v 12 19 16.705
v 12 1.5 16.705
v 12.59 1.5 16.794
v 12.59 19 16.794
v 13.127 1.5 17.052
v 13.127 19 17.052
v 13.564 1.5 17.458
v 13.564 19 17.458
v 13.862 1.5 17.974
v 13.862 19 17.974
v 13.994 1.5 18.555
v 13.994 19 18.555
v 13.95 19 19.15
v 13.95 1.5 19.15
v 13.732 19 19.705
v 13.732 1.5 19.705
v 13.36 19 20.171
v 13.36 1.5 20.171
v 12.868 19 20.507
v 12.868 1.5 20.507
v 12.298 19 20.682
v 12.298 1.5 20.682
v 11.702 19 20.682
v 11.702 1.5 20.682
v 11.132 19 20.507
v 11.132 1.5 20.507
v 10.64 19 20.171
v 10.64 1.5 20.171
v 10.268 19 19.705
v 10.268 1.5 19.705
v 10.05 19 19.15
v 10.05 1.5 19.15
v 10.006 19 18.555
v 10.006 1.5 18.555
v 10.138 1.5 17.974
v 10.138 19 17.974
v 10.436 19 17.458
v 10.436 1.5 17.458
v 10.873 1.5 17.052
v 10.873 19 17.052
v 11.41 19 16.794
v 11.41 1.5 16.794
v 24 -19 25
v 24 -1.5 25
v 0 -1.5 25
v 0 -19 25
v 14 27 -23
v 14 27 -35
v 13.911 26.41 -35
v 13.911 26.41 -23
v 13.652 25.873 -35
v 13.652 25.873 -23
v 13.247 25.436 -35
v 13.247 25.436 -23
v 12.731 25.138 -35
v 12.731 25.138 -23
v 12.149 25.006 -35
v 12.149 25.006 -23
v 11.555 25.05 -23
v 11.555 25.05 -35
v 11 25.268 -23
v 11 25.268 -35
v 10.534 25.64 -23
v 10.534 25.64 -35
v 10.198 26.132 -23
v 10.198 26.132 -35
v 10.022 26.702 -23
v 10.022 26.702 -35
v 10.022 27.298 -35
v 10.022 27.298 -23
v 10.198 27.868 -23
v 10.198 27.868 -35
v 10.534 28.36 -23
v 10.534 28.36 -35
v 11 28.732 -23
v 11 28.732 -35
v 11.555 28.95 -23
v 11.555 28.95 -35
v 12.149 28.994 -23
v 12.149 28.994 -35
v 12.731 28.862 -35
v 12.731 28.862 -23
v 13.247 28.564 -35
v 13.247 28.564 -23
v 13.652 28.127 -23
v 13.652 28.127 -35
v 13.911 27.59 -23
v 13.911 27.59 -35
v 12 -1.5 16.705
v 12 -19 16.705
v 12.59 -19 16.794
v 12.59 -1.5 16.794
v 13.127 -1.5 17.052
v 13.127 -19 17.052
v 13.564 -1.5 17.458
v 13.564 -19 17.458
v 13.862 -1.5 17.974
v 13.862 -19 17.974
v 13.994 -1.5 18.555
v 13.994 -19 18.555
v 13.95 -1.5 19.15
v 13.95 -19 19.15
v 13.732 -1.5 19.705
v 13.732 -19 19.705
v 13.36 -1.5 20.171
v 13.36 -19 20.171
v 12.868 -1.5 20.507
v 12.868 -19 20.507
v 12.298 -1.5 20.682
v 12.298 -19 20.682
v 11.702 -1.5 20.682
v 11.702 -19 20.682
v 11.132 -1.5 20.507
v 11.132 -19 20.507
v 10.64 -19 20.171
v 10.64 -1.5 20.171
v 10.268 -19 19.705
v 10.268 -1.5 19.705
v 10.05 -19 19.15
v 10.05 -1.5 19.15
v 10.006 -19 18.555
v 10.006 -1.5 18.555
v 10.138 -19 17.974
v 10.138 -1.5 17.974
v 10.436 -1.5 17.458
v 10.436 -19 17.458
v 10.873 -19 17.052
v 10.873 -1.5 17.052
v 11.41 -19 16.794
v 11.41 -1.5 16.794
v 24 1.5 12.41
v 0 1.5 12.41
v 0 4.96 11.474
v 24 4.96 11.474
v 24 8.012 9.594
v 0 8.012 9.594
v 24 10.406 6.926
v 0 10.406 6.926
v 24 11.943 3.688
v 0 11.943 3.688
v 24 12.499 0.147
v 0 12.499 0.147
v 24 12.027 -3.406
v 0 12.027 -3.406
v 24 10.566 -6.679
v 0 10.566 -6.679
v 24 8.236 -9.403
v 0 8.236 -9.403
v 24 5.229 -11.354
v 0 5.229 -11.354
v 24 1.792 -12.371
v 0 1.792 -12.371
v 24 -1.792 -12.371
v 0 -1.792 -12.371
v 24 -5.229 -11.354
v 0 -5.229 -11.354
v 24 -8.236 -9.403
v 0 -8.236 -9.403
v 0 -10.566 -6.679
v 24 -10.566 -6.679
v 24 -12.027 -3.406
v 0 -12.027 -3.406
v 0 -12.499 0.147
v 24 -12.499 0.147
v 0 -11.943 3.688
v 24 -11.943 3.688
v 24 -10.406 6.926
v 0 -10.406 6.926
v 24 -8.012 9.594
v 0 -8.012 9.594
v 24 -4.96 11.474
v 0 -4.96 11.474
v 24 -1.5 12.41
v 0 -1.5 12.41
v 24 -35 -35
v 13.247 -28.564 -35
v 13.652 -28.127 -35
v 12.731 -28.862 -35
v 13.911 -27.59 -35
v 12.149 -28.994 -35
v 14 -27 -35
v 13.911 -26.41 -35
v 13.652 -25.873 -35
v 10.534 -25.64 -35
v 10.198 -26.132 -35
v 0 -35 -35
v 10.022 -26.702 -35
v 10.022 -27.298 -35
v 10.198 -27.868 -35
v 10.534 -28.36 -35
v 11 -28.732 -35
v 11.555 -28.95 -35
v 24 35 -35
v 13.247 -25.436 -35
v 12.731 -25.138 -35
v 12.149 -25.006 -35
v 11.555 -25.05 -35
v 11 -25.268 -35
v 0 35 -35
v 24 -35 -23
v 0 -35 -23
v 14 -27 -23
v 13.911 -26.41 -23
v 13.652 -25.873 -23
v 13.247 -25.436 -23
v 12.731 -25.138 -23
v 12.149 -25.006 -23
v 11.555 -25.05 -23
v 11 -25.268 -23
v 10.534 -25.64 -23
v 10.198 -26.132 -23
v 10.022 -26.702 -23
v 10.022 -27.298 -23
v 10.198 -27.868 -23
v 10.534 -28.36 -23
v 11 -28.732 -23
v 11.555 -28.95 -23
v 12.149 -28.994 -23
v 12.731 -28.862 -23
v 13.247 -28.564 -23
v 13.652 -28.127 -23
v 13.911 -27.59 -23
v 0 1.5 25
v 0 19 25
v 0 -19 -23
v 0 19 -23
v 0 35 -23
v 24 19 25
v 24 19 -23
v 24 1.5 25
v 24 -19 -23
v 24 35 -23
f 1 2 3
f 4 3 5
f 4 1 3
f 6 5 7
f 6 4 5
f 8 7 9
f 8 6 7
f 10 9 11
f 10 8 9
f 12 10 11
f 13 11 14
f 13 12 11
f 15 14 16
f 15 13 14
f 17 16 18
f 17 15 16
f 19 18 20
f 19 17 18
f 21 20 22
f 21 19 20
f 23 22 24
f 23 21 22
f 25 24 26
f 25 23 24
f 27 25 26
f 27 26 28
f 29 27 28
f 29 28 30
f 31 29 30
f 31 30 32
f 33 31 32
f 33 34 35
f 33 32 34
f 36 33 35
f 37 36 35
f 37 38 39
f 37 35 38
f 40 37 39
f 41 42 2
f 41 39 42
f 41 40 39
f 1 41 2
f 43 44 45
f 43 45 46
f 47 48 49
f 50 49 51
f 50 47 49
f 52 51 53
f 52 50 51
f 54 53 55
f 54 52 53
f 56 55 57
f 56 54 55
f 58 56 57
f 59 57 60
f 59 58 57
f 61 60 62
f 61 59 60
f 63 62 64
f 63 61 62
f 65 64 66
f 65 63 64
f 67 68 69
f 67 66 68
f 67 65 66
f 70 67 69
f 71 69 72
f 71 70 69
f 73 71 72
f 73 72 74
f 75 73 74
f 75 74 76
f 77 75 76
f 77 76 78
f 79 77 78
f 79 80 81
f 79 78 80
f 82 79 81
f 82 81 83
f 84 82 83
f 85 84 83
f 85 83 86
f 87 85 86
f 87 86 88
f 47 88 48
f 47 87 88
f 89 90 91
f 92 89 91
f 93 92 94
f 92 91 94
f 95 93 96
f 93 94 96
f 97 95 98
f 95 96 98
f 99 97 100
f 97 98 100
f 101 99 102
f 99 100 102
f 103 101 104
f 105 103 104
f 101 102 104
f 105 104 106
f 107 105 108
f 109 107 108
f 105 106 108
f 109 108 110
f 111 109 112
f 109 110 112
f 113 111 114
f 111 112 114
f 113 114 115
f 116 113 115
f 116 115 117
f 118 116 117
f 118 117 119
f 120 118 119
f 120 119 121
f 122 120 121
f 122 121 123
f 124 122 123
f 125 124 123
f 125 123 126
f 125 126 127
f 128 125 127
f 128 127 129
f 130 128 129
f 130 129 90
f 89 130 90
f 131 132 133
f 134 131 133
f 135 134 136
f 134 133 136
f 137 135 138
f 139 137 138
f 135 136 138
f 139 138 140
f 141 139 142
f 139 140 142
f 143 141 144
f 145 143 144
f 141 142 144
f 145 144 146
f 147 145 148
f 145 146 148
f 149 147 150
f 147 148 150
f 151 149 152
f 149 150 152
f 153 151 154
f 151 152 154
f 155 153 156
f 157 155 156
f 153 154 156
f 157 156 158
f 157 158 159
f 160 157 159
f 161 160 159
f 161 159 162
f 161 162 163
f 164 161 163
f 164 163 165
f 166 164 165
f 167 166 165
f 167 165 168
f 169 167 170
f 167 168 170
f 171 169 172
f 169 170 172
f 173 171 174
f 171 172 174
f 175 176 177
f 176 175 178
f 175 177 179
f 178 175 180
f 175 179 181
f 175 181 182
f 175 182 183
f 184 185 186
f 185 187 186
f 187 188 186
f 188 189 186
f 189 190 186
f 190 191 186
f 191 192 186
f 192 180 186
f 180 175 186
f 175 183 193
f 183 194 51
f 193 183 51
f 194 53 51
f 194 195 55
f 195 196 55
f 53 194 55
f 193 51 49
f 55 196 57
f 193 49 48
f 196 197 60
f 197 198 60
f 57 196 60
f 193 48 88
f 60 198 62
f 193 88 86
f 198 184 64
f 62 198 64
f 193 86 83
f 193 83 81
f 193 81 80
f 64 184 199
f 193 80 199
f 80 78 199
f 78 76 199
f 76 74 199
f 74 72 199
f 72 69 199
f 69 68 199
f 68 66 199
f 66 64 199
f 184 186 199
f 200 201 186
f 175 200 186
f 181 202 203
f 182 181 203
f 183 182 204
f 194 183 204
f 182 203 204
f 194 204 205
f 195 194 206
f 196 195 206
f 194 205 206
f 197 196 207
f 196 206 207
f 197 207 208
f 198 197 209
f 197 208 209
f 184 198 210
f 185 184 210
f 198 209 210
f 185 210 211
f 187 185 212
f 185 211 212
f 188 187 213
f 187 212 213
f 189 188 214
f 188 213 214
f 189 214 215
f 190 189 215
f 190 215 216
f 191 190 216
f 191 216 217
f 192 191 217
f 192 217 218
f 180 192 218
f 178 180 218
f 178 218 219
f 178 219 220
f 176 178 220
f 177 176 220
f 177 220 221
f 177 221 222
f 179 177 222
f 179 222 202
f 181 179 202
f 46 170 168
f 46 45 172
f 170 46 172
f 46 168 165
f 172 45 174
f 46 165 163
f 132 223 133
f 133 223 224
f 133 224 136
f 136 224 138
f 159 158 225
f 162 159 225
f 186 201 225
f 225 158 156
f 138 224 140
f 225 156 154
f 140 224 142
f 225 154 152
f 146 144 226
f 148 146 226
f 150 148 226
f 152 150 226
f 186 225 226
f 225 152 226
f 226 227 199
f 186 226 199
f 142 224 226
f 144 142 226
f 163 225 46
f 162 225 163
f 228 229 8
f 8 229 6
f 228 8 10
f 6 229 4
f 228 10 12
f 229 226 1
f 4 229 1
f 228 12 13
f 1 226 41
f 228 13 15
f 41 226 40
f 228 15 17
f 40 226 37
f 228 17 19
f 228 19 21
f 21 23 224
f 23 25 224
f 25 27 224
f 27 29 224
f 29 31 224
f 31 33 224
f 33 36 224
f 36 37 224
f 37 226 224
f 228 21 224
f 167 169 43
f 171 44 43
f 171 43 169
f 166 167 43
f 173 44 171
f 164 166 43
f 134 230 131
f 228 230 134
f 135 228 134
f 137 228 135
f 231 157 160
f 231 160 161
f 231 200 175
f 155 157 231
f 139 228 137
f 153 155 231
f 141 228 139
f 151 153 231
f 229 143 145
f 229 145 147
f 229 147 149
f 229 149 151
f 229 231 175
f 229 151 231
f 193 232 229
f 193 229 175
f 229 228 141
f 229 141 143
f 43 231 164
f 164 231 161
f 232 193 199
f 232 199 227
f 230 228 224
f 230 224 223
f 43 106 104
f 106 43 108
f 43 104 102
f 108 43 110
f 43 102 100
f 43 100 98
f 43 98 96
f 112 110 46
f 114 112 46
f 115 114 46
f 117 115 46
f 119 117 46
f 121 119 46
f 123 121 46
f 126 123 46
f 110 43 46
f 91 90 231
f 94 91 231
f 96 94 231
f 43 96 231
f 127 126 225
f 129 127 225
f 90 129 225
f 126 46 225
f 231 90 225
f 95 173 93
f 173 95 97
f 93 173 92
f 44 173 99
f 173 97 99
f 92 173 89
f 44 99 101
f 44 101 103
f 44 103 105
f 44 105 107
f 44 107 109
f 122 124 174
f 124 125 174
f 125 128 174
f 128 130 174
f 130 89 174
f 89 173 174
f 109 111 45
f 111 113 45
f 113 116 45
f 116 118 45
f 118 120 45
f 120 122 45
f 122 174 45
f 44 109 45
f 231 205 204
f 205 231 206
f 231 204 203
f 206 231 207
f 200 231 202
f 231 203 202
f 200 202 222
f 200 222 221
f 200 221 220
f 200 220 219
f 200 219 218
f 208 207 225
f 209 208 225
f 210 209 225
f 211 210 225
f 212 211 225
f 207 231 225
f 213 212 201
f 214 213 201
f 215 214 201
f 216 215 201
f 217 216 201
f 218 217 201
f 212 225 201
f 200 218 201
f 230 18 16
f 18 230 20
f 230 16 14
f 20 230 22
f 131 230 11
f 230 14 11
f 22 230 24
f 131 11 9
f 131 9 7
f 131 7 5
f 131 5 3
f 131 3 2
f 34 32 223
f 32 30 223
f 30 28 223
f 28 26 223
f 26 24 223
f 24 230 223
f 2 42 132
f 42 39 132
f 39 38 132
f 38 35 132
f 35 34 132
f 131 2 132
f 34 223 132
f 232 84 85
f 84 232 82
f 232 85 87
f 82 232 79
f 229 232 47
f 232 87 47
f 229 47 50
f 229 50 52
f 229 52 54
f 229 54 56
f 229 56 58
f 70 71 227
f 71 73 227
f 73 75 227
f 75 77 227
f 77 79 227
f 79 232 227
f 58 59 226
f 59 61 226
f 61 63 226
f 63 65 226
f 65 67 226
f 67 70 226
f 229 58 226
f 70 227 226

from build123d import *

# Parameters (mm, degrees)
BOSS_EXTRUDE1_DEPTH = 24
SKETCH2_R           = 2
CUT_EXTRUDE1_DEPTH  = 20
SKETCH3_R           = 2
CUT_EXTRUDE2_DEPTH  = 20.5


with BuildPart() as part:
    # Sketch1 → Boss-Extrude1 (new body)
    with BuildSketch(Plane(origin=(0, 0, 0), x_dir=(0, 0, -1), z_dir=(1, 0, 0))):
        with BuildLine():
            Line((23, 35), (23, 19))
            Line((23, 19), (-25, 19))
            Line((-25, 19), (-25, 1.5))
            Line((-25, 1.5), (-12.409673646, 1.5))
            ThreePointArc((-12.409673646, 1.5), (12.5, 0), (-12.409673646, -1.5))
            Line((-12.409673646, -1.5), (-25, -1.5))
            Line((-25, -1.5), (-25, -19))
            Line((-25, -19), (23, -19))
            Line((23, -19), (23, -35))
            Line((23, -35), (35, -35))
            Line((35, -35), (35, 35))
            Line((35, 35), (23, 35))
        make_face()
    extrude(amount=BOSS_EXTRUDE1_DEPTH)

    # Sketch2 → Cut-Extrude1 (cut)
    with BuildSketch(Plane.XY.offset(-23)):
        with Locations((12, -27)):
            Circle(SKETCH2_R)
    cut_extrude1 = extrude(amount=-CUT_EXTRUDE1_DEPTH, mode=Mode.SUBTRACT)

    # Sketch3 → Cut-Extrude2 (cut)
    with BuildSketch(Plane.XZ.offset(19)):
        with Locations(Location((12, 18.704836823, 0), (0, 0, 270))):
            Circle(SKETCH3_R)
    cut_extrude2 = extrude(amount=-CUT_EXTRUDE2_DEPTH, mode=Mode.SUBTRACT)

    # Mirror1: Cut-Extrude1, Cut-Extrude2 across plane
    add(cut_extrude1.mirror(Plane.ZX), mode=Mode.SUBTRACT)
    add(cut_extrude2.mirror(Plane.ZX), mode=Mode.SUBTRACT)


solid = part.part
